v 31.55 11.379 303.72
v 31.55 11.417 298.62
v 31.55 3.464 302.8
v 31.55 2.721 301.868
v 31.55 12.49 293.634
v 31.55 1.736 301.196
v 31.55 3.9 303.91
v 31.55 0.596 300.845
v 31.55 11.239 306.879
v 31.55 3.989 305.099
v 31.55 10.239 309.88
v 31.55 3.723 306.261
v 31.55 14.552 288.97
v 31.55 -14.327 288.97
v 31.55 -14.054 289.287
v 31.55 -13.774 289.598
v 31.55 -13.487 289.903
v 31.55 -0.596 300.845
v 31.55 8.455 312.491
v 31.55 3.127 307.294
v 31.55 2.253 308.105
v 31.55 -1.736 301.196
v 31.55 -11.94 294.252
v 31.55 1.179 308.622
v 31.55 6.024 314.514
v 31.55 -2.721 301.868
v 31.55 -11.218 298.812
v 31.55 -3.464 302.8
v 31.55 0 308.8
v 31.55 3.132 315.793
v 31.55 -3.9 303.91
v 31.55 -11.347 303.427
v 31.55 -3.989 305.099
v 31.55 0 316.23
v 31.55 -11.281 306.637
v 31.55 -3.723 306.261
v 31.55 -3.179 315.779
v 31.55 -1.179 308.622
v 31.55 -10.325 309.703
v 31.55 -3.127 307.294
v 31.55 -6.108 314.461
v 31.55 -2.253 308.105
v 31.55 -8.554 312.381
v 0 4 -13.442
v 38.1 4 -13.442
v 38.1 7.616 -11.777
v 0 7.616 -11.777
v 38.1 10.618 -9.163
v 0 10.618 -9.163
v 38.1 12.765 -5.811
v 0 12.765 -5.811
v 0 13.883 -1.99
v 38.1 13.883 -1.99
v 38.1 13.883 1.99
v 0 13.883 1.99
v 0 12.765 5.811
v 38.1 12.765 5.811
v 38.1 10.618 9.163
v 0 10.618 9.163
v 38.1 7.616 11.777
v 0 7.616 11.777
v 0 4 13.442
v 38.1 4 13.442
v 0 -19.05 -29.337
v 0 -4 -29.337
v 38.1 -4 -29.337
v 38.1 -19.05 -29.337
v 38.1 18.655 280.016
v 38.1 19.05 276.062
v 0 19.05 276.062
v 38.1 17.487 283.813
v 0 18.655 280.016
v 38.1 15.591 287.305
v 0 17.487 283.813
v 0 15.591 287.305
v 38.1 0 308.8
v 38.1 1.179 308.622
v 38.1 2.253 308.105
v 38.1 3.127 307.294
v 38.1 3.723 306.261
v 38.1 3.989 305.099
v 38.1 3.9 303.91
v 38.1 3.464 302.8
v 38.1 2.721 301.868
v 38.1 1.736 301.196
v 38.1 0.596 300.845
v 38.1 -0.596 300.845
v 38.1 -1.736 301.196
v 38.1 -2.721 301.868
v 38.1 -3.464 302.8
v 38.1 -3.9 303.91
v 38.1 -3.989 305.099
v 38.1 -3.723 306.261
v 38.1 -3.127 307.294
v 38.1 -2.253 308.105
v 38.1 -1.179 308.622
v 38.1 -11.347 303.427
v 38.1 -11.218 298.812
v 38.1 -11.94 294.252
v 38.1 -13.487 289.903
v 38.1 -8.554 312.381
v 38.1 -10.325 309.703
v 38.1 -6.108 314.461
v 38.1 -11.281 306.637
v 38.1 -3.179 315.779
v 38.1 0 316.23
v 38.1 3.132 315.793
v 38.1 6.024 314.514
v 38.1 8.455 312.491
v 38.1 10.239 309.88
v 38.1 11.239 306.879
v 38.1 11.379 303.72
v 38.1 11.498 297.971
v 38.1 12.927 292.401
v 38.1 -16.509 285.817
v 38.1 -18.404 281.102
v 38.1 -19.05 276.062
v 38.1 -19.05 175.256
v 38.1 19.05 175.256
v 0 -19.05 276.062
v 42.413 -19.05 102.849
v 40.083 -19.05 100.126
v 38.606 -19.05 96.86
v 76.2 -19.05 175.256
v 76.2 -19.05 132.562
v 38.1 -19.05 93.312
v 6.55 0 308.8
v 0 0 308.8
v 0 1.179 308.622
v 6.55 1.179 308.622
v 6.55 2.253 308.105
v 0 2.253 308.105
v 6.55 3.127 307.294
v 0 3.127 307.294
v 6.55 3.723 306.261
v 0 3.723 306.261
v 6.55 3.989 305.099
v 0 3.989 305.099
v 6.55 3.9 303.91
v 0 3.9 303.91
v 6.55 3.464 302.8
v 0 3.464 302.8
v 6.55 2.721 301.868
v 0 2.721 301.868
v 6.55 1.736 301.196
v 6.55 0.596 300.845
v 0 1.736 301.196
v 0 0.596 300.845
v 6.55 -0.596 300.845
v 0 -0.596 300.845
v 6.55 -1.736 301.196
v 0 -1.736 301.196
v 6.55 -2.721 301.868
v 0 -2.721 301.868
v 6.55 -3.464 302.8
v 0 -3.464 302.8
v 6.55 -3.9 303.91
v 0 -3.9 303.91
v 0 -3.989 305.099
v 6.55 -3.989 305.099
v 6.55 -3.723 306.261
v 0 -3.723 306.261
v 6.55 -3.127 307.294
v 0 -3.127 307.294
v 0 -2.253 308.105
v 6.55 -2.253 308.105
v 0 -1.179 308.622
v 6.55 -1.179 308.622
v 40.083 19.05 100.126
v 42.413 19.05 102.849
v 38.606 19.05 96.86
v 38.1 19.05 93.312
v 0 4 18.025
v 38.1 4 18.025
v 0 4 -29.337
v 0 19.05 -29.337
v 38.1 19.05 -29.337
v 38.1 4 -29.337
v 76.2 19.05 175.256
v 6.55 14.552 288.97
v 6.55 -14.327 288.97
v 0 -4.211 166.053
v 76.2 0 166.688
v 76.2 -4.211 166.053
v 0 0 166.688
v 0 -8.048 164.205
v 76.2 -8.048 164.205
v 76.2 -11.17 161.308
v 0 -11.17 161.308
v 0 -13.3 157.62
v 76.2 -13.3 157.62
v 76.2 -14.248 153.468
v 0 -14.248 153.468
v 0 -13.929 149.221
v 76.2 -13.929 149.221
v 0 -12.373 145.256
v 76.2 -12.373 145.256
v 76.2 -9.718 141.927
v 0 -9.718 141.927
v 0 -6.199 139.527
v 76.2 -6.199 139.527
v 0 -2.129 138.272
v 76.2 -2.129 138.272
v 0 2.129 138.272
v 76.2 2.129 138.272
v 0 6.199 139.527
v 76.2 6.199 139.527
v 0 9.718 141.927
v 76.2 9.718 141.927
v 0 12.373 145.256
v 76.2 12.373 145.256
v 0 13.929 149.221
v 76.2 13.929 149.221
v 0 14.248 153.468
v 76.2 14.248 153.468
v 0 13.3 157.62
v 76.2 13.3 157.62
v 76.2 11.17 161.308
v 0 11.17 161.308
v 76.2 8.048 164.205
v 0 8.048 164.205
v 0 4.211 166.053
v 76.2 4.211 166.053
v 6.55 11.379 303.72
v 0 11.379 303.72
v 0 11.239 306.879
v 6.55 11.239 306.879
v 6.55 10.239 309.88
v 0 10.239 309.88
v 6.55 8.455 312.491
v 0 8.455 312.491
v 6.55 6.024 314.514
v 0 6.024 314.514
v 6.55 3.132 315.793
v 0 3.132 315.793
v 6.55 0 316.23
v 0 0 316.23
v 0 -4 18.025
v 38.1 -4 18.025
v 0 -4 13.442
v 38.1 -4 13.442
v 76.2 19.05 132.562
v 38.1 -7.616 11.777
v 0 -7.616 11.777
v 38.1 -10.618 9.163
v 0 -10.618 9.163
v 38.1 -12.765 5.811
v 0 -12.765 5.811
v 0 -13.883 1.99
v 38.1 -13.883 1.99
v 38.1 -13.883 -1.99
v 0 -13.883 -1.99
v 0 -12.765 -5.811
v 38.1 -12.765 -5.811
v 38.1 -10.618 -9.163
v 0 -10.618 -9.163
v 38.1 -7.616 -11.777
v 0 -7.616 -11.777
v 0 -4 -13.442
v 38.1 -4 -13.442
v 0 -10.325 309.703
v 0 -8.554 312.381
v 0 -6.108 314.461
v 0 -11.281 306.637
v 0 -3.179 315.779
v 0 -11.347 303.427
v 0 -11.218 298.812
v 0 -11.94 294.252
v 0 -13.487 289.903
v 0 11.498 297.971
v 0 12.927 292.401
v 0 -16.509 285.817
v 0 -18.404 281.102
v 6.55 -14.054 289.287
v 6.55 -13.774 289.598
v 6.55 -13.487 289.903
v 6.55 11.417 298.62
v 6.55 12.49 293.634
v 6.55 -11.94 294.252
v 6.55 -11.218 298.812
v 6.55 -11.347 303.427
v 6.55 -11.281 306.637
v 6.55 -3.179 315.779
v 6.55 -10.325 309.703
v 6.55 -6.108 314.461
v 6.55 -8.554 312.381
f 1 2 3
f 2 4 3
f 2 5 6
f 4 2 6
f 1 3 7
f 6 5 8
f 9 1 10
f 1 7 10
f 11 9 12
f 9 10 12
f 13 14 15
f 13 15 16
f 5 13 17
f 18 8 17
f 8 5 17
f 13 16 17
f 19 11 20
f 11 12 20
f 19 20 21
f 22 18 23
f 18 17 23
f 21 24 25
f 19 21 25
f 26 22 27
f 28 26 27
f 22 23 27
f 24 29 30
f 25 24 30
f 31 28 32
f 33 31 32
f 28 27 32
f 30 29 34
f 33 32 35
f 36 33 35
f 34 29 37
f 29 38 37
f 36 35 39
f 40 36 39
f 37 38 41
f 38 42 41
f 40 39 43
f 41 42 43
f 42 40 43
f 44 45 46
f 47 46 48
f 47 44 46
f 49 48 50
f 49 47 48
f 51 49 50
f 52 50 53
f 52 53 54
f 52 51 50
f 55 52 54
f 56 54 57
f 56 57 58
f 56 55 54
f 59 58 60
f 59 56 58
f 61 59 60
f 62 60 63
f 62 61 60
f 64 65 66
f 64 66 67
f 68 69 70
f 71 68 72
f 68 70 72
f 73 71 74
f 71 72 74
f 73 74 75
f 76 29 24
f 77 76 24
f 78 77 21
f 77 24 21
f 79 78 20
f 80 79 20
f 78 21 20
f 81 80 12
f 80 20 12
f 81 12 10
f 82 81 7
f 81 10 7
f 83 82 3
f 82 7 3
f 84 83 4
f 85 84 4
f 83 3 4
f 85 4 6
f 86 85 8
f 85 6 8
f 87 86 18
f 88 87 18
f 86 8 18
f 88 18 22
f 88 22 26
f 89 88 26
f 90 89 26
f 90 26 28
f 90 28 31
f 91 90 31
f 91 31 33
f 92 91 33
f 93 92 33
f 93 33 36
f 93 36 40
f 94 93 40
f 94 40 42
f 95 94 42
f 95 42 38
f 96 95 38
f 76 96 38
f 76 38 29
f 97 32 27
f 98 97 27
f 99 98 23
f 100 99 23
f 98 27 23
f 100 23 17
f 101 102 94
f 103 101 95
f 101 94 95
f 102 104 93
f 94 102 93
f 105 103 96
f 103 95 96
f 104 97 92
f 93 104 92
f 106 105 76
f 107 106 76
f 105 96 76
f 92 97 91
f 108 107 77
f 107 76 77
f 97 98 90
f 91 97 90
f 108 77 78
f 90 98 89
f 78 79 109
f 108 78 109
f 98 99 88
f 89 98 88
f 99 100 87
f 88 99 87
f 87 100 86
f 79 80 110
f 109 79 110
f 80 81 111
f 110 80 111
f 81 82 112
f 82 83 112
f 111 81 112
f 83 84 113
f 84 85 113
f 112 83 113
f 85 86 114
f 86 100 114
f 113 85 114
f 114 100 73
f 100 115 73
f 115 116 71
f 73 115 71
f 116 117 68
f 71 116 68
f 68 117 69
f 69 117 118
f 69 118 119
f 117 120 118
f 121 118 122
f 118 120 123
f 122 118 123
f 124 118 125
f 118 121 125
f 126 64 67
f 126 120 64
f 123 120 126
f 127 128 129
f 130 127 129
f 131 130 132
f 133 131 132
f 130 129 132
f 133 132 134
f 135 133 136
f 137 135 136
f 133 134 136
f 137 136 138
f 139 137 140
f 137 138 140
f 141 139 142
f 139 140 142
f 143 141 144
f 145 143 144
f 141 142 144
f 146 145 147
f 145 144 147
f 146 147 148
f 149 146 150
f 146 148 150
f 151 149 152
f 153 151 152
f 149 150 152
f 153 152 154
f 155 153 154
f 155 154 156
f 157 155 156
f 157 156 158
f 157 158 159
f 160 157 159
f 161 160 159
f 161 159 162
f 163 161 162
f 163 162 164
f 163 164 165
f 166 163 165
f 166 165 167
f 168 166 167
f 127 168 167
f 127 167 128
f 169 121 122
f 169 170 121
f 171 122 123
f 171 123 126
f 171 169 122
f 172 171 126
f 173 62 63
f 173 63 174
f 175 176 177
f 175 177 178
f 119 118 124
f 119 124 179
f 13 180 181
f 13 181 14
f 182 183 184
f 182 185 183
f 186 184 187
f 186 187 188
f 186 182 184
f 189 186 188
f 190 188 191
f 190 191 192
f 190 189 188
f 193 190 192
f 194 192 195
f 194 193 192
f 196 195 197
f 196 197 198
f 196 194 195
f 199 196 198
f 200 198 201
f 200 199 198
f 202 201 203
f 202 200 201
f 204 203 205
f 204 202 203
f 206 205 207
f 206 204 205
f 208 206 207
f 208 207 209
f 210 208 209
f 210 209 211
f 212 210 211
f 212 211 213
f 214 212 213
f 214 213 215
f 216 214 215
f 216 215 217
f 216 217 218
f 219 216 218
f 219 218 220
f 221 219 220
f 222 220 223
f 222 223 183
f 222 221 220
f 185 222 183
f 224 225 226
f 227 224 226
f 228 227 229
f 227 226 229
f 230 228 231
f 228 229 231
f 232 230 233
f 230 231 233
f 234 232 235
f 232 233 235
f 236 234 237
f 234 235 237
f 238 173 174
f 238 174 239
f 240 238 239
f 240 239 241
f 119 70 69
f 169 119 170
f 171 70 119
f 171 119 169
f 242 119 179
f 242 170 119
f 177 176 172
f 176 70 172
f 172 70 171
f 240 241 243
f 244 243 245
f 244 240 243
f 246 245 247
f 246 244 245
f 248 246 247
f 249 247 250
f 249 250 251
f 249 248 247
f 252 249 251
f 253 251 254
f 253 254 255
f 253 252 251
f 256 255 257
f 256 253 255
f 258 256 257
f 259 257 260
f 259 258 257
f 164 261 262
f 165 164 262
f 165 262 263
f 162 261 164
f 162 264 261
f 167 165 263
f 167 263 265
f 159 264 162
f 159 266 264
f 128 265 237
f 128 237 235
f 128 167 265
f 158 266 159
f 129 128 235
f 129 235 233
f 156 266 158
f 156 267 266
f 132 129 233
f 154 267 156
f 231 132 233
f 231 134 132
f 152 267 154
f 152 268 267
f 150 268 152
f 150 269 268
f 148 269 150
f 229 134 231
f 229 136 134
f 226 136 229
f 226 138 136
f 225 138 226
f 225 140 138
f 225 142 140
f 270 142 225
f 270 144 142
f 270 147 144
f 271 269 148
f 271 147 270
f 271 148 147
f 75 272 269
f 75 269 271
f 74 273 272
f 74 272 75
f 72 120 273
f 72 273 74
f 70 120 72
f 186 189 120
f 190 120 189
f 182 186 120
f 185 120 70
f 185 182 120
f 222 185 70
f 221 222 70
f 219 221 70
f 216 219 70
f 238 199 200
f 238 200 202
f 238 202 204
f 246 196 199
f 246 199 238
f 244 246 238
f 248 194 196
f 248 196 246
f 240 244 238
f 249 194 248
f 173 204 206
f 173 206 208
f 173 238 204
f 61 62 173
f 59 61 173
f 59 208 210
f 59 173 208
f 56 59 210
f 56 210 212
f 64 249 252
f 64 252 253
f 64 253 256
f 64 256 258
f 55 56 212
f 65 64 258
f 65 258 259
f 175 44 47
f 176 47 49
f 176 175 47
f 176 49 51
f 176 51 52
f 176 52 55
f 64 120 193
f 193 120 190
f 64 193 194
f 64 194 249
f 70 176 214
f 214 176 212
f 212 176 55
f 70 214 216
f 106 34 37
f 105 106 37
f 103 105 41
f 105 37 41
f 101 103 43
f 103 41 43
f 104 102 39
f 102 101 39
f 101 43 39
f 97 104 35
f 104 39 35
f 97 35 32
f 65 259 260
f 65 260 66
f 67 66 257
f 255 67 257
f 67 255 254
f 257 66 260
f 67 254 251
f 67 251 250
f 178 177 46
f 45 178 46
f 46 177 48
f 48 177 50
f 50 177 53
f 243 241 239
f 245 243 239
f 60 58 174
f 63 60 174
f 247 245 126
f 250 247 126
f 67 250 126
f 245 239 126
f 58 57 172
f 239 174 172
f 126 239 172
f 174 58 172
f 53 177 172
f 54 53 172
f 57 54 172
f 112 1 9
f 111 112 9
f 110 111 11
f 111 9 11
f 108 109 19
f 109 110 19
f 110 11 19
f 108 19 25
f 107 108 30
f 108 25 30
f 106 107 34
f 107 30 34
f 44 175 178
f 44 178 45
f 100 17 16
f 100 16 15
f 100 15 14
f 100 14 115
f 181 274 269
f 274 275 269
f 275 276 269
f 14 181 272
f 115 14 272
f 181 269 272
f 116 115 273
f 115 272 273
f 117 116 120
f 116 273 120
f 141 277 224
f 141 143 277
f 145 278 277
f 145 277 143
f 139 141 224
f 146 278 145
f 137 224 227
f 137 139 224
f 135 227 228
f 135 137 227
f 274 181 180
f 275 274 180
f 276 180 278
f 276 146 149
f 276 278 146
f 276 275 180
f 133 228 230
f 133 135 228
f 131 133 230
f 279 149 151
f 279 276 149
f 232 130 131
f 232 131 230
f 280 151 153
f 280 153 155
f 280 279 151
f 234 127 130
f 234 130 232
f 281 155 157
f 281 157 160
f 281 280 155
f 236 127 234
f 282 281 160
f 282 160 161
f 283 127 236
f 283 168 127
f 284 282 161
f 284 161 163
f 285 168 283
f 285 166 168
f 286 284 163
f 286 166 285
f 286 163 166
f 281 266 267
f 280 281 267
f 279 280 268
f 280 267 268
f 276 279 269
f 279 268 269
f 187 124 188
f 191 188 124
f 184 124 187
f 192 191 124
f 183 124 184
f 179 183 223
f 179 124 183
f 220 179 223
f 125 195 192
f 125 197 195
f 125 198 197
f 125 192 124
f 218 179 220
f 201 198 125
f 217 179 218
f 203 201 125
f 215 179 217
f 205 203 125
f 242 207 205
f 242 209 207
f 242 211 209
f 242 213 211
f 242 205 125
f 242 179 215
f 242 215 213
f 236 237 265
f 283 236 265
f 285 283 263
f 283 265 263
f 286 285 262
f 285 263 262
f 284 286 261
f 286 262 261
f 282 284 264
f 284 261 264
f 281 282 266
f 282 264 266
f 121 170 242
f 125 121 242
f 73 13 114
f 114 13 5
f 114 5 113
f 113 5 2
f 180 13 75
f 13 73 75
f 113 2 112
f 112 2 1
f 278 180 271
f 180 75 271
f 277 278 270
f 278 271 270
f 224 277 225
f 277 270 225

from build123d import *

# Parameters (mm, degrees)
SKETCH1_R           = 14.2875
BOSS_EXTRUDE1_DEPTH = 38.1
SKETCH2_W           = 76.2
SKETCH2_H           = 38.1
SKETCH2_R           = 14.2875
BOSS_EXTRUDE2_DEPTH = 38.1
CUT_EXTRUDE1_DEPTH  = 38.1
FILLET1_R           = 12.7
SKETCH4_W           = 38.1
SKETCH4_H           = 38.1
BOSS_EXTRUDE3_DEPTH = 152.4
SKETCH5_R           = 4
CUT_EXTRUDE2_DEPTH  = 152.4
SKETCH6_W           = 25
SKETCH6_H           = 54.519891076
CUT_EXTRUDE3_DEPTH  = 152.4


with BuildPart() as part:
    # Sketch1 → Boss-Extrude1 (new body)
    with BuildSketch(Plane(origin=(0, 0, 0), x_dir=(0, 0, -1), z_dir=(1, 0, 0))):
        with BuildLine():
            Line((29.337186502, -19.05), (-175.255687154, -19.05))
            Line((-175.255687154, -19.05), (-175.255687154, 19.05))
            Line((-175.255687154, 19.05), (29.337186502, 19.05))
            Line((29.337186502, 19.05), (29.337186502, 4))
            Line((29.337186502, 4), (13.442493258, 4))
            ThreePointArc((13.442493258, 4), (0, 14.025), (-13.442493258, 4))
            Line((-13.442493258, 4), (-18.025, 4))
            Line((-18.025, 4), (-18.025, -4))
            Line((-18.025, -4), (-13.442493258, -4))
            ThreePointArc((-13.442493258, -4), (0, -14.025), (13.442493258, -4))
            Line((13.442493258, -4), (29.337186502, -4))
            Line((29.337186502, -4), (29.337186502, -19.05))
        make_face()
        with Locations(Location((-152.4, 0, 0), (0, 0, 180))):
            Circle(SKETCH1_R, mode=Mode.SUBTRACT)
    extrude(amount=BOSS_EXTRUDE1_DEPTH)

    # Sketch2 → Boss-Extrude2 (add)
    with BuildSketch(Plane(origin=(38.1, 0, 0), x_dir=(0, 0, -1), z_dir=(1, 0, 0))):
        with Locations((-137.155687154, 0)):
            Rectangle(SKETCH2_W, SKETCH2_H)
        with Locations(Location((-152.4, 0, 0), (0, 0, 180))):
            Circle(SKETCH2_R, mode=Mode.SUBTRACT)
    extrude(amount=BOSS_EXTRUDE2_DEPTH)

    # Sketch3 → Cut-Extrude1 (cut)
    with BuildSketch(Plane(origin=(0, 19.05, 0), x_dir=(1, 0, 0), z_dir=(0, 1, 0))):
        Polygon((38.1, -99.055687154), (76.2, -132.562404594), (94.277321555, -84.449227978), align=None)
    extrude(amount=-CUT_EXTRUDE1_DEPTH, mode=Mode.SUBTRACT)

    # Fillet1
    fillet1_edges = [part.edges().sort_by_distance(p)[0] for p in [
        (38.1, 0, 99.055687154),
    ]]
    fillet(fillet1_edges, radius=FILLET1_R)

    # Sketch4 → Boss-Extrude3 (add)
    with BuildSketch(Plane.XY.offset(175.255687154)):
        with Locations((19.05, 0)):
            Rectangle(SKETCH4_W, SKETCH4_H)
    extrude(amount=BOSS_EXTRUDE3_DEPTH)

    # Sketch5 → Cut-Extrude2 (cut)
    with BuildSketch(Plane.ZY):
        Polygon((276.061983206, 26.741787919), (276.061983206, 19.05), (327.655687154, 19.05), (327.655687154, -19.05), (276.061983206, -19.05), (276.061983206, -31.426856949), (335.038222157, -31.426856949), (335.038222157, 26.741787919), align=None)
        with BuildLine():
            Line((327.655687154, 19.05), (276.061983206, 19.05))
            ThreePointArc((276.061983206, 19.05), (281.943389767, 18.165675684), (287.304689246, 15.590905686))
            ThreePointArc((287.304689246, 15.590905686), (295.144592117, 12.051491747), (303.720086759, 11.378870216))
            ThreePointArc((303.720086759, 11.378870216), (312.490952205, 8.455421585), (316.23, 0))
            ThreePointArc((316.23, 0), (312.381148337, -8.554010165), (303.426659685, -11.347195089))
            ThreePointArc((303.426659685, -11.347195089), (296.515249828, -11.473357637), (289.902590337, -13.487367982))
            ThreePointArc((289.902590337, -13.487367982), (283.520288655, -17.607307989), (276.061983206, -19.05))
            Line((276.061983206, -19.05), (327.655687154, -19.05))
            Line((327.655687154, -19.05), (327.655687154, 19.05))
        make_face()
        with Locations((304.8, 0)):
            Circle(SKETCH5_R)
    extrude(amount=-CUT_EXTRUDE2_DEPTH, mode=Mode.SUBTRACT)

    # Sketch6 → Cut-Extrude3 (cut)
    with BuildSketch(Plane.XZ.offset(19.05)):
        with Locations((19.05, 316.23)):
            Rectangle(SKETCH6_W, SKETCH6_H)
    extrude(amount=-CUT_EXTRUDE3_DEPTH, mode=Mode.SUBTRACT)


solid = part.part
